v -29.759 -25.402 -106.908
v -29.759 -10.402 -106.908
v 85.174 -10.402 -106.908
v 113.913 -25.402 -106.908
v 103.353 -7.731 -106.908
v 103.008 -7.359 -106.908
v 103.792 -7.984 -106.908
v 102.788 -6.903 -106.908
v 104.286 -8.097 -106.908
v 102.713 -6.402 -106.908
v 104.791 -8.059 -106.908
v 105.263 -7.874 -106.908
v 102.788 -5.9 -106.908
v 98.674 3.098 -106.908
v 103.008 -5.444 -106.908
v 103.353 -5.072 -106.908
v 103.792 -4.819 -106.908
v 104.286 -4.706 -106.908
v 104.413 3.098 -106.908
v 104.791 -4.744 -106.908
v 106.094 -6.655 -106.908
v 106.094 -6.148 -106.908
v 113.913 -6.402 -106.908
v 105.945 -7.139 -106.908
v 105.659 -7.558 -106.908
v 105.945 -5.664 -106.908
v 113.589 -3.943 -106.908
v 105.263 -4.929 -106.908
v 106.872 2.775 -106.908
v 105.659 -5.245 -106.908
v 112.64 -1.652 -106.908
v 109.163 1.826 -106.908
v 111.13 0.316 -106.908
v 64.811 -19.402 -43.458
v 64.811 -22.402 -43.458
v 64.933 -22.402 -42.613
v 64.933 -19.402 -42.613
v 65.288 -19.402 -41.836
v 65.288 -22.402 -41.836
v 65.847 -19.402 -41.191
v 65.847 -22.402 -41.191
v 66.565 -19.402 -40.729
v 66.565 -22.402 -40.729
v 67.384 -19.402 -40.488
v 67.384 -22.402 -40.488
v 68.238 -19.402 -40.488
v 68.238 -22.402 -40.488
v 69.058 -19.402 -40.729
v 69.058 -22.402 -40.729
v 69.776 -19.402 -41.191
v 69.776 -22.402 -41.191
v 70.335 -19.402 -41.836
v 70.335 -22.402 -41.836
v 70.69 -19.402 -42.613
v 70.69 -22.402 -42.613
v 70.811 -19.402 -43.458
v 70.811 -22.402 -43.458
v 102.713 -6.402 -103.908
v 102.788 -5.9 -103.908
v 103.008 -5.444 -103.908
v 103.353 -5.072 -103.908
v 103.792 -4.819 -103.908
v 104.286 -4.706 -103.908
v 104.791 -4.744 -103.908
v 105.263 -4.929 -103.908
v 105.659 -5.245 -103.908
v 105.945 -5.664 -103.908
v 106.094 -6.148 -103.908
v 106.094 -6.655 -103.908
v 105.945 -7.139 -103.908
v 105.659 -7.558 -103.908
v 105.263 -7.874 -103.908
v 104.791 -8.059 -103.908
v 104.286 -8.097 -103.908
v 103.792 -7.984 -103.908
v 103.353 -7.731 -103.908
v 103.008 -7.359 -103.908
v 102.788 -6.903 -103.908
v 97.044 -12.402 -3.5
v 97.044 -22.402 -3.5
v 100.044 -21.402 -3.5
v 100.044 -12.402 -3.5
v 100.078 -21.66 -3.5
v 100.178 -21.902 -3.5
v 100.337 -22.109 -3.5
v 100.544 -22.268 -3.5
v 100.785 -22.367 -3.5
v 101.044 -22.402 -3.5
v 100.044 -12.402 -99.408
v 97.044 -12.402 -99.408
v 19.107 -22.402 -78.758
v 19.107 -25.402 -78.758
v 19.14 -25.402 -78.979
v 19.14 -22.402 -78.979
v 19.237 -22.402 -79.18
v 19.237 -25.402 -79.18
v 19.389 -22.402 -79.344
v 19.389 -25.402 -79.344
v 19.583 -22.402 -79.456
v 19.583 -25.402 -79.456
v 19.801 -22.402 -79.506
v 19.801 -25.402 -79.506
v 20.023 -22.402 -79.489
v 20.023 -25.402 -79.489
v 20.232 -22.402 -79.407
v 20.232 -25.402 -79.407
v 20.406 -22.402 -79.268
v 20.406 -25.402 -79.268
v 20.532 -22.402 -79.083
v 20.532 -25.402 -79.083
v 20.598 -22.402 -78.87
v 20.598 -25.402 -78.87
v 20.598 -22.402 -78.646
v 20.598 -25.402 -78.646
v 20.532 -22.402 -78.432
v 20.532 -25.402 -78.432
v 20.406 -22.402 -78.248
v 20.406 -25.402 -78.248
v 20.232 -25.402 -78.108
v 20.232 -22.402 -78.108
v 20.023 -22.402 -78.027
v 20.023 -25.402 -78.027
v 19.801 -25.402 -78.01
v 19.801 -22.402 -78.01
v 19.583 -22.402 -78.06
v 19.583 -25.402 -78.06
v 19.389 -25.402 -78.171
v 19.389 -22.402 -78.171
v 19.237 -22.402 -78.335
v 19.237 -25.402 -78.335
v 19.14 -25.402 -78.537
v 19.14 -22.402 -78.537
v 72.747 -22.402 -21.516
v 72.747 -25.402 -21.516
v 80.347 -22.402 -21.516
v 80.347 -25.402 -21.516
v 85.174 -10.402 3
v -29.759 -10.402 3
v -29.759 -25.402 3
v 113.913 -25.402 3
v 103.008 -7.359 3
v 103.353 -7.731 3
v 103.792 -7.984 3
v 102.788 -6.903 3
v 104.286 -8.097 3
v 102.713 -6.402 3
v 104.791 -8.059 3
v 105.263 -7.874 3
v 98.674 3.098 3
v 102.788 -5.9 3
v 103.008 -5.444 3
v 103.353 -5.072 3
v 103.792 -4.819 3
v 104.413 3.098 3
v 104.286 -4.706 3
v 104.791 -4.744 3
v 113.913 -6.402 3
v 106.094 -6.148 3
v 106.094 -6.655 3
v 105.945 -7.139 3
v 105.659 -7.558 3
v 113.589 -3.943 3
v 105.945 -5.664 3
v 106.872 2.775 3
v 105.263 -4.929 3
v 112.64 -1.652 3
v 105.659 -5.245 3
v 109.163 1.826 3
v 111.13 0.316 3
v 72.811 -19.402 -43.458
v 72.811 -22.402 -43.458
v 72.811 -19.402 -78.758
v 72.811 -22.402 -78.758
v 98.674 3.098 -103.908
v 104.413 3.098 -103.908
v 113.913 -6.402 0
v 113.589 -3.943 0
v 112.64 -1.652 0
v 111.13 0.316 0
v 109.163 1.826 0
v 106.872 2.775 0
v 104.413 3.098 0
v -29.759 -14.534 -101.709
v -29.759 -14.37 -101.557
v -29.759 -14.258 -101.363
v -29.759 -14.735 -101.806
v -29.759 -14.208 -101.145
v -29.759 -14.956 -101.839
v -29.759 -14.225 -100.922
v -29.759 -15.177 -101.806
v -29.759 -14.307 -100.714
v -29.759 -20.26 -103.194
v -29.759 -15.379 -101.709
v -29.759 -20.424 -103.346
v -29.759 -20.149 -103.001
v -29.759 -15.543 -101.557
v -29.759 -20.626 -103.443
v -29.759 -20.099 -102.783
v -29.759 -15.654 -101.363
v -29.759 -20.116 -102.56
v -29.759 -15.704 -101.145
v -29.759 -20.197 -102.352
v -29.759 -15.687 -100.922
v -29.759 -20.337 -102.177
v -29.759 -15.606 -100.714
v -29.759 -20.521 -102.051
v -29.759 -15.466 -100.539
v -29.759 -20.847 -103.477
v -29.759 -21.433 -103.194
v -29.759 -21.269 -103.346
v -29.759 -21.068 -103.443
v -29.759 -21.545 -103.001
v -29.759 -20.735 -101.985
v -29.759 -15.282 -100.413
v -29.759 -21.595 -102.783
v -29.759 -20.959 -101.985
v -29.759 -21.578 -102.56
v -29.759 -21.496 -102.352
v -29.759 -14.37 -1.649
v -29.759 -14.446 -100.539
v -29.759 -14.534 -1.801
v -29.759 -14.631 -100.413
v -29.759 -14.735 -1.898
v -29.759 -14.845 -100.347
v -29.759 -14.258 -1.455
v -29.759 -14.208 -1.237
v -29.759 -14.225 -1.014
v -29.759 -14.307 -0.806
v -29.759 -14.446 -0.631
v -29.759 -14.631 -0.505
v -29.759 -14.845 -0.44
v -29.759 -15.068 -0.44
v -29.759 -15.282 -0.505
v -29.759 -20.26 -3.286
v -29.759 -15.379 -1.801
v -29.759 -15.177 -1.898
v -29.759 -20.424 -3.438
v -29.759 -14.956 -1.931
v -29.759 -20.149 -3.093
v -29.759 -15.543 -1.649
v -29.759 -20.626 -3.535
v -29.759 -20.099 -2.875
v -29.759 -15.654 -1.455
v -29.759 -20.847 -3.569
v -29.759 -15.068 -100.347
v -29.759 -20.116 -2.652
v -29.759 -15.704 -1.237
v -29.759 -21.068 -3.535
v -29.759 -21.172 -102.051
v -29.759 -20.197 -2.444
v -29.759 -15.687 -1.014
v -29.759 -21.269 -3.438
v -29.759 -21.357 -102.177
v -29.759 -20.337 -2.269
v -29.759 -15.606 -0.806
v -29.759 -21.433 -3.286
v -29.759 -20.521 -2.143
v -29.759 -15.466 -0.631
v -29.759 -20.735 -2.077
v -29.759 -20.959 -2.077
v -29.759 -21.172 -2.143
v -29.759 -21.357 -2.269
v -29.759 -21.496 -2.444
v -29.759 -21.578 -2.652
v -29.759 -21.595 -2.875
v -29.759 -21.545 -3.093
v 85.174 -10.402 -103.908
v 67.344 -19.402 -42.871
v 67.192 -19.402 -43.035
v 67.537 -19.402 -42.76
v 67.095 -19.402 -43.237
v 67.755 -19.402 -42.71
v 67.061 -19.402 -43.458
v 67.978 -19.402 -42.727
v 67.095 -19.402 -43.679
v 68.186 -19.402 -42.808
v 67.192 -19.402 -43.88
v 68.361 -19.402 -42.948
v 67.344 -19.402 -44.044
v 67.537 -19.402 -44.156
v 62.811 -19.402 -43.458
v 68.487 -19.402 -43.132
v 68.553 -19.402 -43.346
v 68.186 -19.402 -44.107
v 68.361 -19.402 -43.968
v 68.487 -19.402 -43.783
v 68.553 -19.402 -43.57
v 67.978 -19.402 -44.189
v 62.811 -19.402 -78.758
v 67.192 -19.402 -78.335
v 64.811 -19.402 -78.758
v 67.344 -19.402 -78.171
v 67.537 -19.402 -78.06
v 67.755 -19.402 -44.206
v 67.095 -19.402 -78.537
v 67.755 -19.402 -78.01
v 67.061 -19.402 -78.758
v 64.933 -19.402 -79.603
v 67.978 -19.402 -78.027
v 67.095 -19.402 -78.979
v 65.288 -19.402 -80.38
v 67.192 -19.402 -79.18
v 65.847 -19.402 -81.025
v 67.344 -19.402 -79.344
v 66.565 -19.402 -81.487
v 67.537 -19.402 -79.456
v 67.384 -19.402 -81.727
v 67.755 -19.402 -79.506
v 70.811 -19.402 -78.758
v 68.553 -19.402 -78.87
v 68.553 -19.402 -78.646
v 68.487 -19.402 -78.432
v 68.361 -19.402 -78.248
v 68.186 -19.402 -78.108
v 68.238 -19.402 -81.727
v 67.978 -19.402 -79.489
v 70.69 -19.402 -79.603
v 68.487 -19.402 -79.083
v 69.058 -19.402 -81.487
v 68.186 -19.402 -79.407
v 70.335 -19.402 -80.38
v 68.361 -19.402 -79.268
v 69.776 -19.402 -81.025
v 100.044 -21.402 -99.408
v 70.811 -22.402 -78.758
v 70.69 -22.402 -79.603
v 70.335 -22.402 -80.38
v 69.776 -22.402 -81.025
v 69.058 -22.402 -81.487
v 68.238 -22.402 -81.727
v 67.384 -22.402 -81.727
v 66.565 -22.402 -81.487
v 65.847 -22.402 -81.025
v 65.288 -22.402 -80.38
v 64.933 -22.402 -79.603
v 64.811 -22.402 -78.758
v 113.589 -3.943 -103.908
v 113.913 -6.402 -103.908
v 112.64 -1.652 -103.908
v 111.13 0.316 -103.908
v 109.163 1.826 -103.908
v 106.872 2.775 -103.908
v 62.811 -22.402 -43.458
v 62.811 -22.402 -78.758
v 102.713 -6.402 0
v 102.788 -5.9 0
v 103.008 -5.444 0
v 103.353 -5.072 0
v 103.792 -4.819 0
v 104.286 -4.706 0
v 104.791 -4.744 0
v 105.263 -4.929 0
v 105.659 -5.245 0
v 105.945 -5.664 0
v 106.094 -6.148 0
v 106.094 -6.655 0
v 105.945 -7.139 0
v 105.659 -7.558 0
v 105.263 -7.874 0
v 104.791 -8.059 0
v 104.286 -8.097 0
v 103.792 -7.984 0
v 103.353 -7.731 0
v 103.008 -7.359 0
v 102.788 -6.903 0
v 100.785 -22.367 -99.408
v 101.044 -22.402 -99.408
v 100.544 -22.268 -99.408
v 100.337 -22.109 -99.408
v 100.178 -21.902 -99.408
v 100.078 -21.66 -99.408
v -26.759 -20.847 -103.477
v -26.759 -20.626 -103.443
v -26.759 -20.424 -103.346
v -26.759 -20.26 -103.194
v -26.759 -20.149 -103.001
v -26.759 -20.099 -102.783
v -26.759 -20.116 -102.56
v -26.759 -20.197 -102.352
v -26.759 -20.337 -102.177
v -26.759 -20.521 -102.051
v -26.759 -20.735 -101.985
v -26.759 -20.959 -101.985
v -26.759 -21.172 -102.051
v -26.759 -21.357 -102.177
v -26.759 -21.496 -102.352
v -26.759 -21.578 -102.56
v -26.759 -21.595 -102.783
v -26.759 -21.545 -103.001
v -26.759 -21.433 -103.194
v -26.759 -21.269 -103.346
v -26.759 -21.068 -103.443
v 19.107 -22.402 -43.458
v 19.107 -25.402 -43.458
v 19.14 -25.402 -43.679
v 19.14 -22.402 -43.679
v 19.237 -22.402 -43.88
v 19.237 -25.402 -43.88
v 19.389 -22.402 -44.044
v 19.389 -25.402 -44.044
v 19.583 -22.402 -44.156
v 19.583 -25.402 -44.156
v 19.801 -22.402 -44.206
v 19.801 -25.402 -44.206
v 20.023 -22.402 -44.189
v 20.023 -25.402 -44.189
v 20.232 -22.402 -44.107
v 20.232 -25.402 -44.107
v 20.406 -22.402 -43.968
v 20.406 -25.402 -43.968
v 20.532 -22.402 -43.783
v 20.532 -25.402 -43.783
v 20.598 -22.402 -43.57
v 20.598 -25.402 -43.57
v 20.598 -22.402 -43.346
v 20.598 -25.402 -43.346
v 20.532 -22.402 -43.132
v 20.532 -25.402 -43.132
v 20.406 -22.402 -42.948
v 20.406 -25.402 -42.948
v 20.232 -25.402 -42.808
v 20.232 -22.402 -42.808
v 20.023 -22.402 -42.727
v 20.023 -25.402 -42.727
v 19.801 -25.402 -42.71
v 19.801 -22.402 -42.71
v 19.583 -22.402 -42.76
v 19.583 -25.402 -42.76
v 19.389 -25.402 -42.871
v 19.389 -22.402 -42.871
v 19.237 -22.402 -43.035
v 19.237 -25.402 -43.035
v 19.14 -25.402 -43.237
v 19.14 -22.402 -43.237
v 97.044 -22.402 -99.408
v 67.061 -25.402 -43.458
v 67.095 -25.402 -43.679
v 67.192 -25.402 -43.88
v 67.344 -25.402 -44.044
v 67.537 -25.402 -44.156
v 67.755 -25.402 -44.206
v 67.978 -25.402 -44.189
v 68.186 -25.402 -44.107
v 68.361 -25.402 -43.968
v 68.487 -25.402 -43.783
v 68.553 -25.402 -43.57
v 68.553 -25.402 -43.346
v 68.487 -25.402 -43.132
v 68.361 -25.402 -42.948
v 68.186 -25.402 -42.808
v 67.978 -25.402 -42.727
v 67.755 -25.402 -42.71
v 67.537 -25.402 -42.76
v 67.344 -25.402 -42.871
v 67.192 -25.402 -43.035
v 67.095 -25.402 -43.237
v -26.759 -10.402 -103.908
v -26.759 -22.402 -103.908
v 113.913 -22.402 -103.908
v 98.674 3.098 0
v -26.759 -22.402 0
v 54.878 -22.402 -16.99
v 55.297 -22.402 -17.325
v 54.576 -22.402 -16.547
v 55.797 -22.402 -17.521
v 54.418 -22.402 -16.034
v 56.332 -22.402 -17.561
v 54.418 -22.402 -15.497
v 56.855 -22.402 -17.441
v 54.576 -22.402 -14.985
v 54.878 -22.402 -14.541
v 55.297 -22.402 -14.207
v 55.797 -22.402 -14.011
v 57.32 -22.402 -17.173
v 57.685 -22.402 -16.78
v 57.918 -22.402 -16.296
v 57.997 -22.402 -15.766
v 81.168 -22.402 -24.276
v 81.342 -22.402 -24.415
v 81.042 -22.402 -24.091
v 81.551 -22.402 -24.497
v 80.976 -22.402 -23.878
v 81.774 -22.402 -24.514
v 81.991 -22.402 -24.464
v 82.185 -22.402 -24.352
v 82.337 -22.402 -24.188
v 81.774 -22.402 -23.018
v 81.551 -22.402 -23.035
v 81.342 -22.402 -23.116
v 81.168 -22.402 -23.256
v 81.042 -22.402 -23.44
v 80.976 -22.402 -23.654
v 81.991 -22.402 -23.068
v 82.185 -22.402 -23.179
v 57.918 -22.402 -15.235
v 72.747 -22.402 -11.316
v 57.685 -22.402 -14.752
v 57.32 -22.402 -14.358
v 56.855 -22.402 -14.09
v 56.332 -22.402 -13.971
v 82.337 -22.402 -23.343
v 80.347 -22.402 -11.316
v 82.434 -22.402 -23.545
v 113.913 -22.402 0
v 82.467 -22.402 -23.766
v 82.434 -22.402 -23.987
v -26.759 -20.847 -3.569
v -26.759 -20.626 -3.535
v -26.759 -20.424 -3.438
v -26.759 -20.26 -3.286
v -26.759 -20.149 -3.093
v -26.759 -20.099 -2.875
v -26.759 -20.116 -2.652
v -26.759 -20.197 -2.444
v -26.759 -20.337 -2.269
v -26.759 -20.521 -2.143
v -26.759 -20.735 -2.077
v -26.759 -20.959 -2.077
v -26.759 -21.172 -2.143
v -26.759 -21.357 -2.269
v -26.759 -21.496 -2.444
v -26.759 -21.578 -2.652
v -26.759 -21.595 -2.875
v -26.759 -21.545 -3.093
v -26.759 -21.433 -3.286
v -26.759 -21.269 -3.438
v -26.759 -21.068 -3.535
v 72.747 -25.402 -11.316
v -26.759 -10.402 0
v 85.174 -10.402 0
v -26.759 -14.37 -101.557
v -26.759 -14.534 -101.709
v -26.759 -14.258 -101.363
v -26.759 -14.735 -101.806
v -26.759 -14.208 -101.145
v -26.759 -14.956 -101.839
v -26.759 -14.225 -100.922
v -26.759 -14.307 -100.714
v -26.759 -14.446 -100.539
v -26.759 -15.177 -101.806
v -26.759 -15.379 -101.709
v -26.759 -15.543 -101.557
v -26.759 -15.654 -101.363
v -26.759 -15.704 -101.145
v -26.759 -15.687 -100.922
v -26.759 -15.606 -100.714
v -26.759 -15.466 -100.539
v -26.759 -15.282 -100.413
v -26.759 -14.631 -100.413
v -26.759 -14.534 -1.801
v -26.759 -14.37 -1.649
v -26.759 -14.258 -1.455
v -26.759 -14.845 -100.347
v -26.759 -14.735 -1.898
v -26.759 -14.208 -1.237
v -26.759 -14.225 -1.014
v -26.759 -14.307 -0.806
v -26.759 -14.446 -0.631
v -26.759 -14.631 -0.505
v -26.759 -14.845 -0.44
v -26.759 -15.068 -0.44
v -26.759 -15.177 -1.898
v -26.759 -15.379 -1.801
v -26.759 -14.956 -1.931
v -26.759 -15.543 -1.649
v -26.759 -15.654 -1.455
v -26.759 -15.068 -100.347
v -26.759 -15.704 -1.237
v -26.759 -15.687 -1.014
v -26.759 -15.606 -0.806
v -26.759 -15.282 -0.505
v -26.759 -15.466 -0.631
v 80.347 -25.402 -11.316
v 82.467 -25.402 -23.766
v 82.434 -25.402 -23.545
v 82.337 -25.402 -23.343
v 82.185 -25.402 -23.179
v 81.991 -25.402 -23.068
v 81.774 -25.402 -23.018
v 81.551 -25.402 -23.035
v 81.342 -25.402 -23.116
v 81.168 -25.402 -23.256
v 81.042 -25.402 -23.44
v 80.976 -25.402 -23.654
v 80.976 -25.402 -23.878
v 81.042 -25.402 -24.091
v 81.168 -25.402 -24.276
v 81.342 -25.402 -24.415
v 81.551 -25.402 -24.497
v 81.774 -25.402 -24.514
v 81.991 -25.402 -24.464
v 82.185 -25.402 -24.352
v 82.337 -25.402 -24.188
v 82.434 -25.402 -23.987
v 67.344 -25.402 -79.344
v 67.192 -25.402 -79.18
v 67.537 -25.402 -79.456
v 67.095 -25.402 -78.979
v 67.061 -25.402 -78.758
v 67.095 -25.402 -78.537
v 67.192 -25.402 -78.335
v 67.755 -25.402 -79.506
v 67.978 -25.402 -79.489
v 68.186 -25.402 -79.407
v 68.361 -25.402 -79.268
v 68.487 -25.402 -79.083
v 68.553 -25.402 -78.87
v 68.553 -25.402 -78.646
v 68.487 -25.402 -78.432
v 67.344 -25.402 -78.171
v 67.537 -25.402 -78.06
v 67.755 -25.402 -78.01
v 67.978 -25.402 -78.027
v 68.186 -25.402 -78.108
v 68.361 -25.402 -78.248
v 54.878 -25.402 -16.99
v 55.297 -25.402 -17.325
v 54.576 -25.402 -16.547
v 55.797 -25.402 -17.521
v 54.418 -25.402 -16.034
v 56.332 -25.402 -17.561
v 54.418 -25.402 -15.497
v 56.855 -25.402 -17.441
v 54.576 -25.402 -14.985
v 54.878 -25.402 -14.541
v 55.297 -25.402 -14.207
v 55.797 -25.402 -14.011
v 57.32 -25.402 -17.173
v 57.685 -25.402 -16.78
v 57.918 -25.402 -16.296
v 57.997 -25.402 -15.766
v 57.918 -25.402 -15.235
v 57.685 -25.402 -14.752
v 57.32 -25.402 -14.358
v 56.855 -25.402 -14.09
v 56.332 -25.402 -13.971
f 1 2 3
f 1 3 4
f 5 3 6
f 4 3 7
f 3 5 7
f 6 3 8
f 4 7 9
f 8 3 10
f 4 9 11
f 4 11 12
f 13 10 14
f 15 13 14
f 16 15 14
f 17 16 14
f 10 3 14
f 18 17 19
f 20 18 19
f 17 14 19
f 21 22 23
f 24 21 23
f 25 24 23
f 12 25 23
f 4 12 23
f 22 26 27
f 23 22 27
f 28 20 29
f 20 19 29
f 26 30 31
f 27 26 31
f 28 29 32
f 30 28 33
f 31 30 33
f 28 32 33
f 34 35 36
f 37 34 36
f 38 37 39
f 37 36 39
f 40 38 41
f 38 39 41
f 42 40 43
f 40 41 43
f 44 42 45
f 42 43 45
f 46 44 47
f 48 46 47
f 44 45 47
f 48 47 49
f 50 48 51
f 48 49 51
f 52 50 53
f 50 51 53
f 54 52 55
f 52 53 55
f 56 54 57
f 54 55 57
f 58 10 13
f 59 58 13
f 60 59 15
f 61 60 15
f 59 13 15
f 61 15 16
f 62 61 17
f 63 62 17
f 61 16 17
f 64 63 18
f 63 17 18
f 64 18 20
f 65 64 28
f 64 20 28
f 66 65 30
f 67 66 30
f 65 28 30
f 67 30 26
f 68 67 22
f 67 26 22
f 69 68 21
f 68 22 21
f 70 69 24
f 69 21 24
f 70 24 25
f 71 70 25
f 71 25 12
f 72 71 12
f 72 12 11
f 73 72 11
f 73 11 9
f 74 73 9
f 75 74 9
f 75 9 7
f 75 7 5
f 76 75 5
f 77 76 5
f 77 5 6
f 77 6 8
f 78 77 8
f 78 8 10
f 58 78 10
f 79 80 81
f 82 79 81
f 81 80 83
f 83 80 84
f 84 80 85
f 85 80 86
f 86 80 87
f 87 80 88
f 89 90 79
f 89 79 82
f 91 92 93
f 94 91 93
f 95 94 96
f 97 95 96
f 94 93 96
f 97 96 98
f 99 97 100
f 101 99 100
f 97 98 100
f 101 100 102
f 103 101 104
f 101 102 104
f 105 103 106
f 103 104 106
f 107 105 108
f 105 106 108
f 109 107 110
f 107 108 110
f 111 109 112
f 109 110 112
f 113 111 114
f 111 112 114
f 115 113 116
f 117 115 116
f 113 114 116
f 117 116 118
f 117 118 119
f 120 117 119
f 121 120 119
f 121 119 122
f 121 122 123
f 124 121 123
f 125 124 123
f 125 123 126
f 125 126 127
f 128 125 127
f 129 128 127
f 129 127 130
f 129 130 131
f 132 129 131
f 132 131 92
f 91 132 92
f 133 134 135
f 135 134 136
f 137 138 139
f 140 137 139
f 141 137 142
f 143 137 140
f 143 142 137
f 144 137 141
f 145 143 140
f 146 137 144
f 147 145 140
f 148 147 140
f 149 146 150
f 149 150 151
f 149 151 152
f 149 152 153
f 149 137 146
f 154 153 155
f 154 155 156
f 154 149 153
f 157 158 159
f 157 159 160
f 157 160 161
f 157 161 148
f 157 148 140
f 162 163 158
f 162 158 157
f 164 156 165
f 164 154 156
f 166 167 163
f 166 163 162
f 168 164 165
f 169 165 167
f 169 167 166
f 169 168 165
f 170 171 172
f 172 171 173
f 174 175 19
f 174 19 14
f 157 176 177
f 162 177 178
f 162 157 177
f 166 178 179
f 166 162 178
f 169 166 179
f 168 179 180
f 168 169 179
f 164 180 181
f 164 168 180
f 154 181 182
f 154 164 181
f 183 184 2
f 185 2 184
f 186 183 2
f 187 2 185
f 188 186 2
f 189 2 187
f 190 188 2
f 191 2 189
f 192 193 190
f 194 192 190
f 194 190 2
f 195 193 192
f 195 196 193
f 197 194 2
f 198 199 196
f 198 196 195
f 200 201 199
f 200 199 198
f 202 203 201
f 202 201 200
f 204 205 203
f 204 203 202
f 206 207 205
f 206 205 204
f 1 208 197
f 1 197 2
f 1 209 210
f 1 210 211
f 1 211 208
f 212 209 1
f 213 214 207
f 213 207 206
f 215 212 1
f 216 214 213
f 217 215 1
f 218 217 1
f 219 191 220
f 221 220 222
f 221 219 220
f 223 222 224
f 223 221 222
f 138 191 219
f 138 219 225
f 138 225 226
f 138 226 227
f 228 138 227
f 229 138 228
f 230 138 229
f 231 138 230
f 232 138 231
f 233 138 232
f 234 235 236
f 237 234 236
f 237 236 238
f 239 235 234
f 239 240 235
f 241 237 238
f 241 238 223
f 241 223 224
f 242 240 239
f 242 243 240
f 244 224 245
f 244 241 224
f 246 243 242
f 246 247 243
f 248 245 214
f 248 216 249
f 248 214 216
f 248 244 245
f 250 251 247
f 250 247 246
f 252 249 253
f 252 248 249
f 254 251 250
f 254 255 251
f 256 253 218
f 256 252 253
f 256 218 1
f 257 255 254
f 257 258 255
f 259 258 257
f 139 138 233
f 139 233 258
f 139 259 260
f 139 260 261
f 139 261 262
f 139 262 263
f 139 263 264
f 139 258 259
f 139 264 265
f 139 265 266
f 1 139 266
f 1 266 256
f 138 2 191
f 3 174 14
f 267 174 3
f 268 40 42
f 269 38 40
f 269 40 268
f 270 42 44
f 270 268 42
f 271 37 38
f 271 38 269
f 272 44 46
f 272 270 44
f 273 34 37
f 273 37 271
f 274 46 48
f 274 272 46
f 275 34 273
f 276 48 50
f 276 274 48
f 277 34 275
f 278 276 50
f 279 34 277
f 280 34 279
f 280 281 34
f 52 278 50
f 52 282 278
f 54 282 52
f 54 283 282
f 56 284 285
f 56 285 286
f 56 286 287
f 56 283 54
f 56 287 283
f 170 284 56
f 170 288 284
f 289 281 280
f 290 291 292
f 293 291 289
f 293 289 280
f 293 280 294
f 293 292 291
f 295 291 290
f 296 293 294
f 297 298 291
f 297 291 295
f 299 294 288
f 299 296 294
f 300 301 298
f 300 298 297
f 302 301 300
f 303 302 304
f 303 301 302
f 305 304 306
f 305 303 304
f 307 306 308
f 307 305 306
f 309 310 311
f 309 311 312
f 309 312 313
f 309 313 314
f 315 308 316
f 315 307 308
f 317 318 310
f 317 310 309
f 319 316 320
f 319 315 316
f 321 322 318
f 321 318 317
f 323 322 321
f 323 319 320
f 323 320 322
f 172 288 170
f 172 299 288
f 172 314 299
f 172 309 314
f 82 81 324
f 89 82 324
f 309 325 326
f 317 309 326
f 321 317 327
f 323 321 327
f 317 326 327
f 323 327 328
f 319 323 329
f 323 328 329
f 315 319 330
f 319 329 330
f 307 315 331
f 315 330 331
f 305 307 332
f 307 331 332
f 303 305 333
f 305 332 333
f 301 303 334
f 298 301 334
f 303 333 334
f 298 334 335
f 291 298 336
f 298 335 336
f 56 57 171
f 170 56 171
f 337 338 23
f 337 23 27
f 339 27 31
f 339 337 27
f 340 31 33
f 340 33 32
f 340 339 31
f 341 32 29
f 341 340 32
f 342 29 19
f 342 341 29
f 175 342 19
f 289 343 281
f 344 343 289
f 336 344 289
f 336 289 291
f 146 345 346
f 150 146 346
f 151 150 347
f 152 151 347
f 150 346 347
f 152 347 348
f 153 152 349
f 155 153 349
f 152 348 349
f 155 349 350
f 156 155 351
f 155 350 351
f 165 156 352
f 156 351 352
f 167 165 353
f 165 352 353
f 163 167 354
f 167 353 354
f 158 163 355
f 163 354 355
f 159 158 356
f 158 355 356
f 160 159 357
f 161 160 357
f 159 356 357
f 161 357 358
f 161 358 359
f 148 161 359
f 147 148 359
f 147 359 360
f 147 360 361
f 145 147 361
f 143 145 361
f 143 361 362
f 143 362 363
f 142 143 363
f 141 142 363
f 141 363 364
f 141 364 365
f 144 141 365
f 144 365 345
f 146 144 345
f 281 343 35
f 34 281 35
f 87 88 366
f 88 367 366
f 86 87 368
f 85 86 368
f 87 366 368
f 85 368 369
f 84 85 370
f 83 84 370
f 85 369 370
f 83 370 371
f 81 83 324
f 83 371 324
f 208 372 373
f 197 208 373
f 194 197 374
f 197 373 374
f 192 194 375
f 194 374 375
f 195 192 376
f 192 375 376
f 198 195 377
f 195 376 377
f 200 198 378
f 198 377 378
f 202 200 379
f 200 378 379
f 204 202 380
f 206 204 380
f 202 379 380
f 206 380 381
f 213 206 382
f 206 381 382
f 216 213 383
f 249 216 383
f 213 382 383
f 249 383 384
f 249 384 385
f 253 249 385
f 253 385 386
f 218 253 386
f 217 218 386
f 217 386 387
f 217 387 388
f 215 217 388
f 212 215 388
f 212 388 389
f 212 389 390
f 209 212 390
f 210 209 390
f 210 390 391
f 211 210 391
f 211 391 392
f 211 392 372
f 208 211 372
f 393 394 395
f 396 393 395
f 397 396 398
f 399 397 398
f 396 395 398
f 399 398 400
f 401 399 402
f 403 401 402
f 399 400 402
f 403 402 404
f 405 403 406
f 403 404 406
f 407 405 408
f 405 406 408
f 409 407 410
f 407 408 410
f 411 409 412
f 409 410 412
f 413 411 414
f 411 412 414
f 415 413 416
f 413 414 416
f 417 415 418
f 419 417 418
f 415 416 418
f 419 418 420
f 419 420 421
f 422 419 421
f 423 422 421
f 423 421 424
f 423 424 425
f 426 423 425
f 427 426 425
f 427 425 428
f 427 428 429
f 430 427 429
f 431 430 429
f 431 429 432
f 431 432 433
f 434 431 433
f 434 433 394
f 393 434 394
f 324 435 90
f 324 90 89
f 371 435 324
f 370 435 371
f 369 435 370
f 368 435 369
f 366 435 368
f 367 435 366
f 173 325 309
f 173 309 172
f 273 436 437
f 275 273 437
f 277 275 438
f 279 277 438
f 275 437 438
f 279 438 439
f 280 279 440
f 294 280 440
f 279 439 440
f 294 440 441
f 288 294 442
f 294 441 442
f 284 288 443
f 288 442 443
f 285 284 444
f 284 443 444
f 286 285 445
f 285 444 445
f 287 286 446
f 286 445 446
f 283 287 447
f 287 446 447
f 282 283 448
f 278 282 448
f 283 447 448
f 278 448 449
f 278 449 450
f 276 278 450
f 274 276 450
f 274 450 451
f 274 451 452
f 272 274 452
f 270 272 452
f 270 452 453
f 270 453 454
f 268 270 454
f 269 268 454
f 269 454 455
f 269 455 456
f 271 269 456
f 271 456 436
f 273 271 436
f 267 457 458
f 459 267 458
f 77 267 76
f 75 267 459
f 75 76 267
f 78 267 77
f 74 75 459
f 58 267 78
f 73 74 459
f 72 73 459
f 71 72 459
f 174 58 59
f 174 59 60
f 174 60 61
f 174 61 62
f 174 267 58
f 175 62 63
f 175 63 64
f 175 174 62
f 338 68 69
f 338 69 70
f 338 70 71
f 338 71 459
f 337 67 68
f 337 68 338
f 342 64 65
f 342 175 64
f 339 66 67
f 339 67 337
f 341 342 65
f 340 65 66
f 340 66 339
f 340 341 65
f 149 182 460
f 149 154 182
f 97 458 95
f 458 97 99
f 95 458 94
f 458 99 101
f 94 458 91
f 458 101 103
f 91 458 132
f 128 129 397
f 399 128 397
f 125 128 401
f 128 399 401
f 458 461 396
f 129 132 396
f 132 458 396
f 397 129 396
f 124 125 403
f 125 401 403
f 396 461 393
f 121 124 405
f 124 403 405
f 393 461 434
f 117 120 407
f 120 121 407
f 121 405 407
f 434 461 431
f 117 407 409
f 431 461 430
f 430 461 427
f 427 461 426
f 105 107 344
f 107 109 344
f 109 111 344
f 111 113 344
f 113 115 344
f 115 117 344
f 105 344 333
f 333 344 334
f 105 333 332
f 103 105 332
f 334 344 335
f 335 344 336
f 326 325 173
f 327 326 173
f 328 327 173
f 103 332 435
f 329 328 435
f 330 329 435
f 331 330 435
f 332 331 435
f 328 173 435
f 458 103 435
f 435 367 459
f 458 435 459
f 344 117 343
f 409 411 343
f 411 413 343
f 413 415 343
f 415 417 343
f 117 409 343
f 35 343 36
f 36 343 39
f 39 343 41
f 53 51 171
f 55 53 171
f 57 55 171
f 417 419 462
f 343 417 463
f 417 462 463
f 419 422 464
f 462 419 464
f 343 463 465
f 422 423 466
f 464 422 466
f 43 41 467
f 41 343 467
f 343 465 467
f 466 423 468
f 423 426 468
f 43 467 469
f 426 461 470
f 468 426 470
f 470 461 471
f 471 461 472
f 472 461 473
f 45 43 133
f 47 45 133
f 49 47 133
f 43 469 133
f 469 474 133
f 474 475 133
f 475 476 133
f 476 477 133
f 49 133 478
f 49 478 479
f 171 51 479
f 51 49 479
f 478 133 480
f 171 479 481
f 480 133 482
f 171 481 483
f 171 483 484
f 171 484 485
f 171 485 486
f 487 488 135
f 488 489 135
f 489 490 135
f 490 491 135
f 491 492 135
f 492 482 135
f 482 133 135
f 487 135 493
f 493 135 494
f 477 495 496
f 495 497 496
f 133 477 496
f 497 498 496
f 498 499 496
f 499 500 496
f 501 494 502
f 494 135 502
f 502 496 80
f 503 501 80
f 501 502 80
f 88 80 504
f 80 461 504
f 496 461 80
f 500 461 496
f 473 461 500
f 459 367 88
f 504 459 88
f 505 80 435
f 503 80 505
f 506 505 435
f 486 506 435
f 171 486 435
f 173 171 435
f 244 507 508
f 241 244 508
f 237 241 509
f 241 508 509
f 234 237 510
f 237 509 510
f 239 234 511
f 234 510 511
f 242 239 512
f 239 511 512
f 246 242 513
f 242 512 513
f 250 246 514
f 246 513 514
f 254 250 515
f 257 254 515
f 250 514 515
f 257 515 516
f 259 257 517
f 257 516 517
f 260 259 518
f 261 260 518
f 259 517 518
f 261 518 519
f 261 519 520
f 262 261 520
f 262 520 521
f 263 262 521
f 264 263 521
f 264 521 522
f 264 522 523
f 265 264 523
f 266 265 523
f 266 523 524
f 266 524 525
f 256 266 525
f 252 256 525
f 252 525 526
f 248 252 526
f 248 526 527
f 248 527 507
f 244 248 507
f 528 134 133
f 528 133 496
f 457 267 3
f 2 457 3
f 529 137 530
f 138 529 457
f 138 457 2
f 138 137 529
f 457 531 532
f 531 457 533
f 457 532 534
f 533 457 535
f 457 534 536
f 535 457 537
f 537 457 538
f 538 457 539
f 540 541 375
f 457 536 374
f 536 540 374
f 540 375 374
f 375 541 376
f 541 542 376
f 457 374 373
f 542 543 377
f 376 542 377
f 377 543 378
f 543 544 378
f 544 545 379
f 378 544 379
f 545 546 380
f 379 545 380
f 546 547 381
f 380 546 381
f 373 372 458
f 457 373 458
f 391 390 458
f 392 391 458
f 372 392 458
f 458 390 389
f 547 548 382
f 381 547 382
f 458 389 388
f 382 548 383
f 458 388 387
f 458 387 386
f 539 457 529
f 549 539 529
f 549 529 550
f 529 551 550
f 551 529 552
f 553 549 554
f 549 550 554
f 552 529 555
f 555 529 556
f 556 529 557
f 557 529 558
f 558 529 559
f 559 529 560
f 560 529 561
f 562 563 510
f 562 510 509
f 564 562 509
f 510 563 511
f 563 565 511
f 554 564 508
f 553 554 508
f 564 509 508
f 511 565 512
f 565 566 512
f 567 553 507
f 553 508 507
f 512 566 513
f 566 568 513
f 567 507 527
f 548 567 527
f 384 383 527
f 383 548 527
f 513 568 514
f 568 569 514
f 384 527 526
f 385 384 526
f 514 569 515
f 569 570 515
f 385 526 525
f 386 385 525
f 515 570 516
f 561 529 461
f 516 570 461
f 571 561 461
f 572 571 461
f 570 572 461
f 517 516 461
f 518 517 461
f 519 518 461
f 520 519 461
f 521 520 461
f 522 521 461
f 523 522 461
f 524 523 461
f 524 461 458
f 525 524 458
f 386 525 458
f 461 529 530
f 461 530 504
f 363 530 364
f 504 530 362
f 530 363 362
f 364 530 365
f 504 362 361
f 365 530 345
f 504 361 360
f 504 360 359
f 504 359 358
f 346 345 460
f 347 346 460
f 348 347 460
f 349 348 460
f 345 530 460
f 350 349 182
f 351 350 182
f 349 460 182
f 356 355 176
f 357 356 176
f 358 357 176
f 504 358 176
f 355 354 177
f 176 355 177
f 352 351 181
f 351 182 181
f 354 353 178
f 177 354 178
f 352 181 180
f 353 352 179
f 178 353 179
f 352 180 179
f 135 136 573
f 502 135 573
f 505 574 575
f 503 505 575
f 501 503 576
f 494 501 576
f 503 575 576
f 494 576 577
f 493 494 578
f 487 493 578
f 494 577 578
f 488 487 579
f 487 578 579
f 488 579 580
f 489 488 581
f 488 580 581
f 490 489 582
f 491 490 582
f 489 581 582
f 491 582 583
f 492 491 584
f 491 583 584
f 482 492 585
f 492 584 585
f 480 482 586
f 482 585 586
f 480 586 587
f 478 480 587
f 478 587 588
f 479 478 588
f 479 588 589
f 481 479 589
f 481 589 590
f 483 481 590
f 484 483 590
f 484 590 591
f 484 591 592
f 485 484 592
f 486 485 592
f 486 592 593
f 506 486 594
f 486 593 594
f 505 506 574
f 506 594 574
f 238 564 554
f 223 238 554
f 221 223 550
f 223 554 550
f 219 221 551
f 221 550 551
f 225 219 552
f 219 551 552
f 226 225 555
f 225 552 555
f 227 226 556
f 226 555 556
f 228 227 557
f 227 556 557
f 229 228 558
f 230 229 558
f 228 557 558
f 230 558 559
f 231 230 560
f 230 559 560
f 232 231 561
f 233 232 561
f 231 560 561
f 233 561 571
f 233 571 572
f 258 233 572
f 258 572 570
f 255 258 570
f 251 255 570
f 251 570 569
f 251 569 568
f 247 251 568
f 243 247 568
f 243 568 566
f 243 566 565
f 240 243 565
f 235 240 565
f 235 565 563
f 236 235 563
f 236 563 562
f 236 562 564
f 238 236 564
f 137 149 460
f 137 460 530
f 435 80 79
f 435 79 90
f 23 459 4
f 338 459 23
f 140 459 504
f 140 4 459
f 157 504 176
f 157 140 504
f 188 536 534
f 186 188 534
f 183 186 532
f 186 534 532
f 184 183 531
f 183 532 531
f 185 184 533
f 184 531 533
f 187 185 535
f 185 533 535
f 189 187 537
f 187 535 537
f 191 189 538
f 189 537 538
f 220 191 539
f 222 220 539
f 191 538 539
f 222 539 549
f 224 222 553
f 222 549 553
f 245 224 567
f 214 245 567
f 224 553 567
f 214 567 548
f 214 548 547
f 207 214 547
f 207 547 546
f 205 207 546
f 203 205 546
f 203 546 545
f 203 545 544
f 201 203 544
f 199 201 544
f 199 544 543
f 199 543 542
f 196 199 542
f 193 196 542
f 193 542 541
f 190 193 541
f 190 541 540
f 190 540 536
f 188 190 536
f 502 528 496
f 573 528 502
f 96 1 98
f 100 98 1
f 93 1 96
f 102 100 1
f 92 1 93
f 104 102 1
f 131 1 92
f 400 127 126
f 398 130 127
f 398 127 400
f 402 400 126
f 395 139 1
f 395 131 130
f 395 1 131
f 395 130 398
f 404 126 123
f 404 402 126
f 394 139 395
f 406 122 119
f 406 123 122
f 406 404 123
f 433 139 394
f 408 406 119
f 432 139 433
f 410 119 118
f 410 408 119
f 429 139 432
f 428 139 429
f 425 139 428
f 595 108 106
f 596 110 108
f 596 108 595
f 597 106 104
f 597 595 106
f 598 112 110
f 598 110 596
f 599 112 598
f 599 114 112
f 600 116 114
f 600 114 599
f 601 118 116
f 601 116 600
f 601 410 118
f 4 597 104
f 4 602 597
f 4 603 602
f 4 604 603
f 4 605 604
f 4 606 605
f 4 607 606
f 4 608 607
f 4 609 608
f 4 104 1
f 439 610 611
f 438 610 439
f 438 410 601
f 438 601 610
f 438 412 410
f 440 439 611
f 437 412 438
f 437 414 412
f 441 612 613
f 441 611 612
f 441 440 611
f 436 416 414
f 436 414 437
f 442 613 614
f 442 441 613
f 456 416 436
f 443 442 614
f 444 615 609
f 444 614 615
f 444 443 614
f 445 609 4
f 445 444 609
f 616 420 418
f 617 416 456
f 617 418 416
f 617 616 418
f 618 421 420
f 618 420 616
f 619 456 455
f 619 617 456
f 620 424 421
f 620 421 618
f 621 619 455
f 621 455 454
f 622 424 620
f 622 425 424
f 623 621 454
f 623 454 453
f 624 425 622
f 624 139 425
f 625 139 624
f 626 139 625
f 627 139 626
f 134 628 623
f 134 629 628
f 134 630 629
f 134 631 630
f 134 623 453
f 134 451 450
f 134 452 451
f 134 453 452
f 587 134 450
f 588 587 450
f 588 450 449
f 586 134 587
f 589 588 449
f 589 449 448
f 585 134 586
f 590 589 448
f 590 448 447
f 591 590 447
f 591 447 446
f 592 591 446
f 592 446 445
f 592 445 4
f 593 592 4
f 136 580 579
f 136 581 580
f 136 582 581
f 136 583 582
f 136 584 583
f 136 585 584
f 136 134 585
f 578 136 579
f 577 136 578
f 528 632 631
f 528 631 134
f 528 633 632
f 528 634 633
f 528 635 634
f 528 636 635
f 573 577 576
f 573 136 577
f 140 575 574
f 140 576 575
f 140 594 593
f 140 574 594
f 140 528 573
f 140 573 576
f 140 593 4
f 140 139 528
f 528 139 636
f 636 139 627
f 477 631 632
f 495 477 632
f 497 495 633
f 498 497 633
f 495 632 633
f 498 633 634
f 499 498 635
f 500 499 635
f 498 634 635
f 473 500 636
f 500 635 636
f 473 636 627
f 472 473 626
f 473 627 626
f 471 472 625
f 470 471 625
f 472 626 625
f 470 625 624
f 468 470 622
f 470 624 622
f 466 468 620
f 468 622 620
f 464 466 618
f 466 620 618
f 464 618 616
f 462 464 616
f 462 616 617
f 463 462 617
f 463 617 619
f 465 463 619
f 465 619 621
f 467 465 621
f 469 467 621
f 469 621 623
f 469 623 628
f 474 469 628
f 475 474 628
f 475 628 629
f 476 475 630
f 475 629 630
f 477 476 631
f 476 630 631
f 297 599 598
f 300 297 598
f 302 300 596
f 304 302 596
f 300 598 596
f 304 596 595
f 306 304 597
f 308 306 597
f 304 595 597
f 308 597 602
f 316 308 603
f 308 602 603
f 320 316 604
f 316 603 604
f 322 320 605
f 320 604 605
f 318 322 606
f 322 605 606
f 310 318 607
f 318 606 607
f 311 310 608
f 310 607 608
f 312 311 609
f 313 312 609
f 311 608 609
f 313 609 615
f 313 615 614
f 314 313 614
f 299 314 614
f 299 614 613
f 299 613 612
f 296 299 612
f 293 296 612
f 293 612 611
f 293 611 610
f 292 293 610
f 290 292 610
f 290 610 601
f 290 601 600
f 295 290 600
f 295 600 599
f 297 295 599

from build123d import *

# Parameters (mm, degrees)
EXTRUDE_1_DEPTH             = 103.907768917
SHELL_1_T                   = 3
HOLE_WIZARD_M3_1_D          = 3.4
SKETCH_6_W                  = 3
SKETCH_6_H                  = 95.907768917
EXTRUDE_2_DEPTH             = 10
SKETCH_10_R                 = 3
SKETCH_10_W                 = 10
SKETCH_10_H                 = 35.3
EXTRUDE_3_DEPTH             = 3
HOLE_WIZARD_M2_2_D          = 1.5
HOLE_WIZARD_M2_3_D          = 1.5
SKETCH_17_R                 = 1.8
SKETCH_17_R_2               = 0.75
SKETCH_17_W                 = 7.6
SKETCH_17_H                 = 10.2
CUT_EXTRUDE_1_DEPTH         = 3
FILLET_1_R                  = 1
TAP_DRILL_FOR_M2_TAP1_D     = 1.5
TAP_DRILL_FOR_M2_TAP1_DEPTH = 3


with BuildPart() as part:
    # 草图1 → 凸台-拉伸1 (new body)
    with BuildSketch(Plane.XY):
        with BuildLine():
            Line((113.912965174, -22.401534746), (113.912965174, -6.401534746))
            ThreePointArc((113.912965174, -6.401534746), (111.130479595, 0.315979676), (104.412965174, 3.098465254))
            Line((104.412965174, 3.098465254), (98.673756893, 3.098465254))
            Line((98.673756893, 3.098465254), (85.173756893, -10.401534746))
            Line((85.173756893, -10.401534746), (-26.759170781, -10.401534746))
            Line((-26.759170781, -10.401534746), (-26.759170781, -22.401534746))
            Line((-26.759170781, -22.401534746), (113.912965174, -22.401534746))
        make_face()
    extrude(amount=-EXTRUDE_1_DEPTH)

    # 抽壳1
    shell_1_openings = [part.faces().sort_by_distance(p)[0] for p in [
        (113.912965174, -14.401534746, -51.953884458),
        (111.130479595, 0.315979676, -51.953884458),
        (101.543361033, 3.098465254, -51.953884458),
        (91.923756893, -3.651534746, -51.953884458),
        (29.207293056, -10.401534746, -51.953884458),
    ]]
    offset(amount=SHELL_1_T, openings=shell_1_openings, kind=Kind.INTERSECTION)

    # M3 间隙孔1 (through all)
    with Locations(Plane.XY.offset(3)):
        with Locations((104.412965174, -6.401534746)):
            Hole(HOLE_WIZARD_M3_1_D / 2)

    # 草图6 → 凸台-拉伸2 (add)
    with BuildSketch(Plane(origin=(0, -22.401534746, 0), x_dir=(1, 0, 0), z_dir=(0, 1, 0))):
        with Locations((98.543945955, 51.453884459)):
            Rectangle(SKETCH_6_W, SKETCH_6_H)
    extrude(amount=EXTRUDE_2_DEPTH)

    # 草图10 → 凸台-拉伸3 (add)
    with BuildSketch(Plane(origin=(0, -22.401534746, 0), x_dir=(1, 0, 0), z_dir=(0, 1, 0))):
        with Locations((67.811261753, 78.757768917)):
            Circle(SKETCH_10_R)
        with Locations((67.811261753, 43.457768917)):
            Circle(SKETCH_10_R)
        with Locations((67.811261753, 61.107768917)):
            Rectangle(SKETCH_10_W, SKETCH_10_H)
        with BuildLine():
            ThreePointArc((64.811261753, 43.457768917), (67.811261753, 40.457768917), (70.811261753, 43.457768917))
            Line((70.811261753, 43.457768917), (64.811261753, 43.457768917))
        make_face()
        with BuildLine():
            Line((64.811261753, 43.457768917), (70.811261753, 43.457768917))
            ThreePointArc((70.811261753, 43.457768917), (67.811261753, 46.457768917), (64.811261753, 43.457768917))
        make_face()
        with BuildLine():
            ThreePointArc((64.811261753, 78.757768917), (67.811261753, 75.757768917), (70.811261753, 78.757768917))
            Line((70.811261753, 78.757768917), (64.811261753, 78.757768917))
        make_face()
        with BuildLine():
            Line((64.811261753, 78.757768917), (70.811261753, 78.757768917))
            ThreePointArc((70.811261753, 78.757768917), (67.811261753, 81.757768917), (64.811261753, 78.757768917))
        make_face()
    extrude(amount=EXTRUDE_3_DEPTH)

    # M2 螺纹孔的螺纹孔钻头2 (through all)
    with Locations(Plane(origin=(0, -19.401534746, 0), x_dir=(1, 0, 0), z_dir=(0, 1, 0))):
        with Locations((67.811261753, 43.457768917), (67.811261753, 78.757768917)):
            Hole(HOLE_WIZARD_M2_2_D / 2)

    # M2 螺纹孔的螺纹孔钻头3 (through all)
    with Locations(Plane(origin=(0, -22.401534746, 0), x_dir=(1, 0, 0), z_dir=(0, 1, 0))):
        with Locations((19.856566152, 43.457768917), (19.856566152, 78.757768917)):
            Hole(HOLE_WIZARD_M2_3_D / 2)

    # 草图17 → 切除-拉伸1 (cut)
    with BuildSketch(Plane.XZ.offset(25.401534746)):
        with Locations((56.1974918, -15.765719737)):
            Circle(SKETCH_17_R)
        with Locations((81.7174918, -23.765719737)):
            Circle(SKETCH_17_R_2)
        with Locations((76.5474918, -16.415719737)):
            Rectangle(SKETCH_17_W, SKETCH_17_H)
    extrude(amount=-CUT_EXTRUDE_1_DEPTH, mode=Mode.SUBTRACT)

    # 圆角1
    fillet_1_edges = [part.edges().sort_by_distance(p)[0] for p in [
        (100.043945955, -22.401534746, -51.453884458),
    ]]
    fillet(fillet_1_edges, radius=FILLET_1_R)

    # Tap Drill for M2 Tap1
    with Locations(Plane.ZY.offset(29.759170781)):
        with Locations((-2.818814719, -20.846782883), (-1.181185281, -14.956286608), (-102.726583636, -20.846782883), (-101.088954197, -14.956286608)):
            Hole(TAP_DRILL_FOR_M2_TAP1_D / 2, depth=TAP_DRILL_FOR_M2_TAP1_DEPTH)


solid = part.part
